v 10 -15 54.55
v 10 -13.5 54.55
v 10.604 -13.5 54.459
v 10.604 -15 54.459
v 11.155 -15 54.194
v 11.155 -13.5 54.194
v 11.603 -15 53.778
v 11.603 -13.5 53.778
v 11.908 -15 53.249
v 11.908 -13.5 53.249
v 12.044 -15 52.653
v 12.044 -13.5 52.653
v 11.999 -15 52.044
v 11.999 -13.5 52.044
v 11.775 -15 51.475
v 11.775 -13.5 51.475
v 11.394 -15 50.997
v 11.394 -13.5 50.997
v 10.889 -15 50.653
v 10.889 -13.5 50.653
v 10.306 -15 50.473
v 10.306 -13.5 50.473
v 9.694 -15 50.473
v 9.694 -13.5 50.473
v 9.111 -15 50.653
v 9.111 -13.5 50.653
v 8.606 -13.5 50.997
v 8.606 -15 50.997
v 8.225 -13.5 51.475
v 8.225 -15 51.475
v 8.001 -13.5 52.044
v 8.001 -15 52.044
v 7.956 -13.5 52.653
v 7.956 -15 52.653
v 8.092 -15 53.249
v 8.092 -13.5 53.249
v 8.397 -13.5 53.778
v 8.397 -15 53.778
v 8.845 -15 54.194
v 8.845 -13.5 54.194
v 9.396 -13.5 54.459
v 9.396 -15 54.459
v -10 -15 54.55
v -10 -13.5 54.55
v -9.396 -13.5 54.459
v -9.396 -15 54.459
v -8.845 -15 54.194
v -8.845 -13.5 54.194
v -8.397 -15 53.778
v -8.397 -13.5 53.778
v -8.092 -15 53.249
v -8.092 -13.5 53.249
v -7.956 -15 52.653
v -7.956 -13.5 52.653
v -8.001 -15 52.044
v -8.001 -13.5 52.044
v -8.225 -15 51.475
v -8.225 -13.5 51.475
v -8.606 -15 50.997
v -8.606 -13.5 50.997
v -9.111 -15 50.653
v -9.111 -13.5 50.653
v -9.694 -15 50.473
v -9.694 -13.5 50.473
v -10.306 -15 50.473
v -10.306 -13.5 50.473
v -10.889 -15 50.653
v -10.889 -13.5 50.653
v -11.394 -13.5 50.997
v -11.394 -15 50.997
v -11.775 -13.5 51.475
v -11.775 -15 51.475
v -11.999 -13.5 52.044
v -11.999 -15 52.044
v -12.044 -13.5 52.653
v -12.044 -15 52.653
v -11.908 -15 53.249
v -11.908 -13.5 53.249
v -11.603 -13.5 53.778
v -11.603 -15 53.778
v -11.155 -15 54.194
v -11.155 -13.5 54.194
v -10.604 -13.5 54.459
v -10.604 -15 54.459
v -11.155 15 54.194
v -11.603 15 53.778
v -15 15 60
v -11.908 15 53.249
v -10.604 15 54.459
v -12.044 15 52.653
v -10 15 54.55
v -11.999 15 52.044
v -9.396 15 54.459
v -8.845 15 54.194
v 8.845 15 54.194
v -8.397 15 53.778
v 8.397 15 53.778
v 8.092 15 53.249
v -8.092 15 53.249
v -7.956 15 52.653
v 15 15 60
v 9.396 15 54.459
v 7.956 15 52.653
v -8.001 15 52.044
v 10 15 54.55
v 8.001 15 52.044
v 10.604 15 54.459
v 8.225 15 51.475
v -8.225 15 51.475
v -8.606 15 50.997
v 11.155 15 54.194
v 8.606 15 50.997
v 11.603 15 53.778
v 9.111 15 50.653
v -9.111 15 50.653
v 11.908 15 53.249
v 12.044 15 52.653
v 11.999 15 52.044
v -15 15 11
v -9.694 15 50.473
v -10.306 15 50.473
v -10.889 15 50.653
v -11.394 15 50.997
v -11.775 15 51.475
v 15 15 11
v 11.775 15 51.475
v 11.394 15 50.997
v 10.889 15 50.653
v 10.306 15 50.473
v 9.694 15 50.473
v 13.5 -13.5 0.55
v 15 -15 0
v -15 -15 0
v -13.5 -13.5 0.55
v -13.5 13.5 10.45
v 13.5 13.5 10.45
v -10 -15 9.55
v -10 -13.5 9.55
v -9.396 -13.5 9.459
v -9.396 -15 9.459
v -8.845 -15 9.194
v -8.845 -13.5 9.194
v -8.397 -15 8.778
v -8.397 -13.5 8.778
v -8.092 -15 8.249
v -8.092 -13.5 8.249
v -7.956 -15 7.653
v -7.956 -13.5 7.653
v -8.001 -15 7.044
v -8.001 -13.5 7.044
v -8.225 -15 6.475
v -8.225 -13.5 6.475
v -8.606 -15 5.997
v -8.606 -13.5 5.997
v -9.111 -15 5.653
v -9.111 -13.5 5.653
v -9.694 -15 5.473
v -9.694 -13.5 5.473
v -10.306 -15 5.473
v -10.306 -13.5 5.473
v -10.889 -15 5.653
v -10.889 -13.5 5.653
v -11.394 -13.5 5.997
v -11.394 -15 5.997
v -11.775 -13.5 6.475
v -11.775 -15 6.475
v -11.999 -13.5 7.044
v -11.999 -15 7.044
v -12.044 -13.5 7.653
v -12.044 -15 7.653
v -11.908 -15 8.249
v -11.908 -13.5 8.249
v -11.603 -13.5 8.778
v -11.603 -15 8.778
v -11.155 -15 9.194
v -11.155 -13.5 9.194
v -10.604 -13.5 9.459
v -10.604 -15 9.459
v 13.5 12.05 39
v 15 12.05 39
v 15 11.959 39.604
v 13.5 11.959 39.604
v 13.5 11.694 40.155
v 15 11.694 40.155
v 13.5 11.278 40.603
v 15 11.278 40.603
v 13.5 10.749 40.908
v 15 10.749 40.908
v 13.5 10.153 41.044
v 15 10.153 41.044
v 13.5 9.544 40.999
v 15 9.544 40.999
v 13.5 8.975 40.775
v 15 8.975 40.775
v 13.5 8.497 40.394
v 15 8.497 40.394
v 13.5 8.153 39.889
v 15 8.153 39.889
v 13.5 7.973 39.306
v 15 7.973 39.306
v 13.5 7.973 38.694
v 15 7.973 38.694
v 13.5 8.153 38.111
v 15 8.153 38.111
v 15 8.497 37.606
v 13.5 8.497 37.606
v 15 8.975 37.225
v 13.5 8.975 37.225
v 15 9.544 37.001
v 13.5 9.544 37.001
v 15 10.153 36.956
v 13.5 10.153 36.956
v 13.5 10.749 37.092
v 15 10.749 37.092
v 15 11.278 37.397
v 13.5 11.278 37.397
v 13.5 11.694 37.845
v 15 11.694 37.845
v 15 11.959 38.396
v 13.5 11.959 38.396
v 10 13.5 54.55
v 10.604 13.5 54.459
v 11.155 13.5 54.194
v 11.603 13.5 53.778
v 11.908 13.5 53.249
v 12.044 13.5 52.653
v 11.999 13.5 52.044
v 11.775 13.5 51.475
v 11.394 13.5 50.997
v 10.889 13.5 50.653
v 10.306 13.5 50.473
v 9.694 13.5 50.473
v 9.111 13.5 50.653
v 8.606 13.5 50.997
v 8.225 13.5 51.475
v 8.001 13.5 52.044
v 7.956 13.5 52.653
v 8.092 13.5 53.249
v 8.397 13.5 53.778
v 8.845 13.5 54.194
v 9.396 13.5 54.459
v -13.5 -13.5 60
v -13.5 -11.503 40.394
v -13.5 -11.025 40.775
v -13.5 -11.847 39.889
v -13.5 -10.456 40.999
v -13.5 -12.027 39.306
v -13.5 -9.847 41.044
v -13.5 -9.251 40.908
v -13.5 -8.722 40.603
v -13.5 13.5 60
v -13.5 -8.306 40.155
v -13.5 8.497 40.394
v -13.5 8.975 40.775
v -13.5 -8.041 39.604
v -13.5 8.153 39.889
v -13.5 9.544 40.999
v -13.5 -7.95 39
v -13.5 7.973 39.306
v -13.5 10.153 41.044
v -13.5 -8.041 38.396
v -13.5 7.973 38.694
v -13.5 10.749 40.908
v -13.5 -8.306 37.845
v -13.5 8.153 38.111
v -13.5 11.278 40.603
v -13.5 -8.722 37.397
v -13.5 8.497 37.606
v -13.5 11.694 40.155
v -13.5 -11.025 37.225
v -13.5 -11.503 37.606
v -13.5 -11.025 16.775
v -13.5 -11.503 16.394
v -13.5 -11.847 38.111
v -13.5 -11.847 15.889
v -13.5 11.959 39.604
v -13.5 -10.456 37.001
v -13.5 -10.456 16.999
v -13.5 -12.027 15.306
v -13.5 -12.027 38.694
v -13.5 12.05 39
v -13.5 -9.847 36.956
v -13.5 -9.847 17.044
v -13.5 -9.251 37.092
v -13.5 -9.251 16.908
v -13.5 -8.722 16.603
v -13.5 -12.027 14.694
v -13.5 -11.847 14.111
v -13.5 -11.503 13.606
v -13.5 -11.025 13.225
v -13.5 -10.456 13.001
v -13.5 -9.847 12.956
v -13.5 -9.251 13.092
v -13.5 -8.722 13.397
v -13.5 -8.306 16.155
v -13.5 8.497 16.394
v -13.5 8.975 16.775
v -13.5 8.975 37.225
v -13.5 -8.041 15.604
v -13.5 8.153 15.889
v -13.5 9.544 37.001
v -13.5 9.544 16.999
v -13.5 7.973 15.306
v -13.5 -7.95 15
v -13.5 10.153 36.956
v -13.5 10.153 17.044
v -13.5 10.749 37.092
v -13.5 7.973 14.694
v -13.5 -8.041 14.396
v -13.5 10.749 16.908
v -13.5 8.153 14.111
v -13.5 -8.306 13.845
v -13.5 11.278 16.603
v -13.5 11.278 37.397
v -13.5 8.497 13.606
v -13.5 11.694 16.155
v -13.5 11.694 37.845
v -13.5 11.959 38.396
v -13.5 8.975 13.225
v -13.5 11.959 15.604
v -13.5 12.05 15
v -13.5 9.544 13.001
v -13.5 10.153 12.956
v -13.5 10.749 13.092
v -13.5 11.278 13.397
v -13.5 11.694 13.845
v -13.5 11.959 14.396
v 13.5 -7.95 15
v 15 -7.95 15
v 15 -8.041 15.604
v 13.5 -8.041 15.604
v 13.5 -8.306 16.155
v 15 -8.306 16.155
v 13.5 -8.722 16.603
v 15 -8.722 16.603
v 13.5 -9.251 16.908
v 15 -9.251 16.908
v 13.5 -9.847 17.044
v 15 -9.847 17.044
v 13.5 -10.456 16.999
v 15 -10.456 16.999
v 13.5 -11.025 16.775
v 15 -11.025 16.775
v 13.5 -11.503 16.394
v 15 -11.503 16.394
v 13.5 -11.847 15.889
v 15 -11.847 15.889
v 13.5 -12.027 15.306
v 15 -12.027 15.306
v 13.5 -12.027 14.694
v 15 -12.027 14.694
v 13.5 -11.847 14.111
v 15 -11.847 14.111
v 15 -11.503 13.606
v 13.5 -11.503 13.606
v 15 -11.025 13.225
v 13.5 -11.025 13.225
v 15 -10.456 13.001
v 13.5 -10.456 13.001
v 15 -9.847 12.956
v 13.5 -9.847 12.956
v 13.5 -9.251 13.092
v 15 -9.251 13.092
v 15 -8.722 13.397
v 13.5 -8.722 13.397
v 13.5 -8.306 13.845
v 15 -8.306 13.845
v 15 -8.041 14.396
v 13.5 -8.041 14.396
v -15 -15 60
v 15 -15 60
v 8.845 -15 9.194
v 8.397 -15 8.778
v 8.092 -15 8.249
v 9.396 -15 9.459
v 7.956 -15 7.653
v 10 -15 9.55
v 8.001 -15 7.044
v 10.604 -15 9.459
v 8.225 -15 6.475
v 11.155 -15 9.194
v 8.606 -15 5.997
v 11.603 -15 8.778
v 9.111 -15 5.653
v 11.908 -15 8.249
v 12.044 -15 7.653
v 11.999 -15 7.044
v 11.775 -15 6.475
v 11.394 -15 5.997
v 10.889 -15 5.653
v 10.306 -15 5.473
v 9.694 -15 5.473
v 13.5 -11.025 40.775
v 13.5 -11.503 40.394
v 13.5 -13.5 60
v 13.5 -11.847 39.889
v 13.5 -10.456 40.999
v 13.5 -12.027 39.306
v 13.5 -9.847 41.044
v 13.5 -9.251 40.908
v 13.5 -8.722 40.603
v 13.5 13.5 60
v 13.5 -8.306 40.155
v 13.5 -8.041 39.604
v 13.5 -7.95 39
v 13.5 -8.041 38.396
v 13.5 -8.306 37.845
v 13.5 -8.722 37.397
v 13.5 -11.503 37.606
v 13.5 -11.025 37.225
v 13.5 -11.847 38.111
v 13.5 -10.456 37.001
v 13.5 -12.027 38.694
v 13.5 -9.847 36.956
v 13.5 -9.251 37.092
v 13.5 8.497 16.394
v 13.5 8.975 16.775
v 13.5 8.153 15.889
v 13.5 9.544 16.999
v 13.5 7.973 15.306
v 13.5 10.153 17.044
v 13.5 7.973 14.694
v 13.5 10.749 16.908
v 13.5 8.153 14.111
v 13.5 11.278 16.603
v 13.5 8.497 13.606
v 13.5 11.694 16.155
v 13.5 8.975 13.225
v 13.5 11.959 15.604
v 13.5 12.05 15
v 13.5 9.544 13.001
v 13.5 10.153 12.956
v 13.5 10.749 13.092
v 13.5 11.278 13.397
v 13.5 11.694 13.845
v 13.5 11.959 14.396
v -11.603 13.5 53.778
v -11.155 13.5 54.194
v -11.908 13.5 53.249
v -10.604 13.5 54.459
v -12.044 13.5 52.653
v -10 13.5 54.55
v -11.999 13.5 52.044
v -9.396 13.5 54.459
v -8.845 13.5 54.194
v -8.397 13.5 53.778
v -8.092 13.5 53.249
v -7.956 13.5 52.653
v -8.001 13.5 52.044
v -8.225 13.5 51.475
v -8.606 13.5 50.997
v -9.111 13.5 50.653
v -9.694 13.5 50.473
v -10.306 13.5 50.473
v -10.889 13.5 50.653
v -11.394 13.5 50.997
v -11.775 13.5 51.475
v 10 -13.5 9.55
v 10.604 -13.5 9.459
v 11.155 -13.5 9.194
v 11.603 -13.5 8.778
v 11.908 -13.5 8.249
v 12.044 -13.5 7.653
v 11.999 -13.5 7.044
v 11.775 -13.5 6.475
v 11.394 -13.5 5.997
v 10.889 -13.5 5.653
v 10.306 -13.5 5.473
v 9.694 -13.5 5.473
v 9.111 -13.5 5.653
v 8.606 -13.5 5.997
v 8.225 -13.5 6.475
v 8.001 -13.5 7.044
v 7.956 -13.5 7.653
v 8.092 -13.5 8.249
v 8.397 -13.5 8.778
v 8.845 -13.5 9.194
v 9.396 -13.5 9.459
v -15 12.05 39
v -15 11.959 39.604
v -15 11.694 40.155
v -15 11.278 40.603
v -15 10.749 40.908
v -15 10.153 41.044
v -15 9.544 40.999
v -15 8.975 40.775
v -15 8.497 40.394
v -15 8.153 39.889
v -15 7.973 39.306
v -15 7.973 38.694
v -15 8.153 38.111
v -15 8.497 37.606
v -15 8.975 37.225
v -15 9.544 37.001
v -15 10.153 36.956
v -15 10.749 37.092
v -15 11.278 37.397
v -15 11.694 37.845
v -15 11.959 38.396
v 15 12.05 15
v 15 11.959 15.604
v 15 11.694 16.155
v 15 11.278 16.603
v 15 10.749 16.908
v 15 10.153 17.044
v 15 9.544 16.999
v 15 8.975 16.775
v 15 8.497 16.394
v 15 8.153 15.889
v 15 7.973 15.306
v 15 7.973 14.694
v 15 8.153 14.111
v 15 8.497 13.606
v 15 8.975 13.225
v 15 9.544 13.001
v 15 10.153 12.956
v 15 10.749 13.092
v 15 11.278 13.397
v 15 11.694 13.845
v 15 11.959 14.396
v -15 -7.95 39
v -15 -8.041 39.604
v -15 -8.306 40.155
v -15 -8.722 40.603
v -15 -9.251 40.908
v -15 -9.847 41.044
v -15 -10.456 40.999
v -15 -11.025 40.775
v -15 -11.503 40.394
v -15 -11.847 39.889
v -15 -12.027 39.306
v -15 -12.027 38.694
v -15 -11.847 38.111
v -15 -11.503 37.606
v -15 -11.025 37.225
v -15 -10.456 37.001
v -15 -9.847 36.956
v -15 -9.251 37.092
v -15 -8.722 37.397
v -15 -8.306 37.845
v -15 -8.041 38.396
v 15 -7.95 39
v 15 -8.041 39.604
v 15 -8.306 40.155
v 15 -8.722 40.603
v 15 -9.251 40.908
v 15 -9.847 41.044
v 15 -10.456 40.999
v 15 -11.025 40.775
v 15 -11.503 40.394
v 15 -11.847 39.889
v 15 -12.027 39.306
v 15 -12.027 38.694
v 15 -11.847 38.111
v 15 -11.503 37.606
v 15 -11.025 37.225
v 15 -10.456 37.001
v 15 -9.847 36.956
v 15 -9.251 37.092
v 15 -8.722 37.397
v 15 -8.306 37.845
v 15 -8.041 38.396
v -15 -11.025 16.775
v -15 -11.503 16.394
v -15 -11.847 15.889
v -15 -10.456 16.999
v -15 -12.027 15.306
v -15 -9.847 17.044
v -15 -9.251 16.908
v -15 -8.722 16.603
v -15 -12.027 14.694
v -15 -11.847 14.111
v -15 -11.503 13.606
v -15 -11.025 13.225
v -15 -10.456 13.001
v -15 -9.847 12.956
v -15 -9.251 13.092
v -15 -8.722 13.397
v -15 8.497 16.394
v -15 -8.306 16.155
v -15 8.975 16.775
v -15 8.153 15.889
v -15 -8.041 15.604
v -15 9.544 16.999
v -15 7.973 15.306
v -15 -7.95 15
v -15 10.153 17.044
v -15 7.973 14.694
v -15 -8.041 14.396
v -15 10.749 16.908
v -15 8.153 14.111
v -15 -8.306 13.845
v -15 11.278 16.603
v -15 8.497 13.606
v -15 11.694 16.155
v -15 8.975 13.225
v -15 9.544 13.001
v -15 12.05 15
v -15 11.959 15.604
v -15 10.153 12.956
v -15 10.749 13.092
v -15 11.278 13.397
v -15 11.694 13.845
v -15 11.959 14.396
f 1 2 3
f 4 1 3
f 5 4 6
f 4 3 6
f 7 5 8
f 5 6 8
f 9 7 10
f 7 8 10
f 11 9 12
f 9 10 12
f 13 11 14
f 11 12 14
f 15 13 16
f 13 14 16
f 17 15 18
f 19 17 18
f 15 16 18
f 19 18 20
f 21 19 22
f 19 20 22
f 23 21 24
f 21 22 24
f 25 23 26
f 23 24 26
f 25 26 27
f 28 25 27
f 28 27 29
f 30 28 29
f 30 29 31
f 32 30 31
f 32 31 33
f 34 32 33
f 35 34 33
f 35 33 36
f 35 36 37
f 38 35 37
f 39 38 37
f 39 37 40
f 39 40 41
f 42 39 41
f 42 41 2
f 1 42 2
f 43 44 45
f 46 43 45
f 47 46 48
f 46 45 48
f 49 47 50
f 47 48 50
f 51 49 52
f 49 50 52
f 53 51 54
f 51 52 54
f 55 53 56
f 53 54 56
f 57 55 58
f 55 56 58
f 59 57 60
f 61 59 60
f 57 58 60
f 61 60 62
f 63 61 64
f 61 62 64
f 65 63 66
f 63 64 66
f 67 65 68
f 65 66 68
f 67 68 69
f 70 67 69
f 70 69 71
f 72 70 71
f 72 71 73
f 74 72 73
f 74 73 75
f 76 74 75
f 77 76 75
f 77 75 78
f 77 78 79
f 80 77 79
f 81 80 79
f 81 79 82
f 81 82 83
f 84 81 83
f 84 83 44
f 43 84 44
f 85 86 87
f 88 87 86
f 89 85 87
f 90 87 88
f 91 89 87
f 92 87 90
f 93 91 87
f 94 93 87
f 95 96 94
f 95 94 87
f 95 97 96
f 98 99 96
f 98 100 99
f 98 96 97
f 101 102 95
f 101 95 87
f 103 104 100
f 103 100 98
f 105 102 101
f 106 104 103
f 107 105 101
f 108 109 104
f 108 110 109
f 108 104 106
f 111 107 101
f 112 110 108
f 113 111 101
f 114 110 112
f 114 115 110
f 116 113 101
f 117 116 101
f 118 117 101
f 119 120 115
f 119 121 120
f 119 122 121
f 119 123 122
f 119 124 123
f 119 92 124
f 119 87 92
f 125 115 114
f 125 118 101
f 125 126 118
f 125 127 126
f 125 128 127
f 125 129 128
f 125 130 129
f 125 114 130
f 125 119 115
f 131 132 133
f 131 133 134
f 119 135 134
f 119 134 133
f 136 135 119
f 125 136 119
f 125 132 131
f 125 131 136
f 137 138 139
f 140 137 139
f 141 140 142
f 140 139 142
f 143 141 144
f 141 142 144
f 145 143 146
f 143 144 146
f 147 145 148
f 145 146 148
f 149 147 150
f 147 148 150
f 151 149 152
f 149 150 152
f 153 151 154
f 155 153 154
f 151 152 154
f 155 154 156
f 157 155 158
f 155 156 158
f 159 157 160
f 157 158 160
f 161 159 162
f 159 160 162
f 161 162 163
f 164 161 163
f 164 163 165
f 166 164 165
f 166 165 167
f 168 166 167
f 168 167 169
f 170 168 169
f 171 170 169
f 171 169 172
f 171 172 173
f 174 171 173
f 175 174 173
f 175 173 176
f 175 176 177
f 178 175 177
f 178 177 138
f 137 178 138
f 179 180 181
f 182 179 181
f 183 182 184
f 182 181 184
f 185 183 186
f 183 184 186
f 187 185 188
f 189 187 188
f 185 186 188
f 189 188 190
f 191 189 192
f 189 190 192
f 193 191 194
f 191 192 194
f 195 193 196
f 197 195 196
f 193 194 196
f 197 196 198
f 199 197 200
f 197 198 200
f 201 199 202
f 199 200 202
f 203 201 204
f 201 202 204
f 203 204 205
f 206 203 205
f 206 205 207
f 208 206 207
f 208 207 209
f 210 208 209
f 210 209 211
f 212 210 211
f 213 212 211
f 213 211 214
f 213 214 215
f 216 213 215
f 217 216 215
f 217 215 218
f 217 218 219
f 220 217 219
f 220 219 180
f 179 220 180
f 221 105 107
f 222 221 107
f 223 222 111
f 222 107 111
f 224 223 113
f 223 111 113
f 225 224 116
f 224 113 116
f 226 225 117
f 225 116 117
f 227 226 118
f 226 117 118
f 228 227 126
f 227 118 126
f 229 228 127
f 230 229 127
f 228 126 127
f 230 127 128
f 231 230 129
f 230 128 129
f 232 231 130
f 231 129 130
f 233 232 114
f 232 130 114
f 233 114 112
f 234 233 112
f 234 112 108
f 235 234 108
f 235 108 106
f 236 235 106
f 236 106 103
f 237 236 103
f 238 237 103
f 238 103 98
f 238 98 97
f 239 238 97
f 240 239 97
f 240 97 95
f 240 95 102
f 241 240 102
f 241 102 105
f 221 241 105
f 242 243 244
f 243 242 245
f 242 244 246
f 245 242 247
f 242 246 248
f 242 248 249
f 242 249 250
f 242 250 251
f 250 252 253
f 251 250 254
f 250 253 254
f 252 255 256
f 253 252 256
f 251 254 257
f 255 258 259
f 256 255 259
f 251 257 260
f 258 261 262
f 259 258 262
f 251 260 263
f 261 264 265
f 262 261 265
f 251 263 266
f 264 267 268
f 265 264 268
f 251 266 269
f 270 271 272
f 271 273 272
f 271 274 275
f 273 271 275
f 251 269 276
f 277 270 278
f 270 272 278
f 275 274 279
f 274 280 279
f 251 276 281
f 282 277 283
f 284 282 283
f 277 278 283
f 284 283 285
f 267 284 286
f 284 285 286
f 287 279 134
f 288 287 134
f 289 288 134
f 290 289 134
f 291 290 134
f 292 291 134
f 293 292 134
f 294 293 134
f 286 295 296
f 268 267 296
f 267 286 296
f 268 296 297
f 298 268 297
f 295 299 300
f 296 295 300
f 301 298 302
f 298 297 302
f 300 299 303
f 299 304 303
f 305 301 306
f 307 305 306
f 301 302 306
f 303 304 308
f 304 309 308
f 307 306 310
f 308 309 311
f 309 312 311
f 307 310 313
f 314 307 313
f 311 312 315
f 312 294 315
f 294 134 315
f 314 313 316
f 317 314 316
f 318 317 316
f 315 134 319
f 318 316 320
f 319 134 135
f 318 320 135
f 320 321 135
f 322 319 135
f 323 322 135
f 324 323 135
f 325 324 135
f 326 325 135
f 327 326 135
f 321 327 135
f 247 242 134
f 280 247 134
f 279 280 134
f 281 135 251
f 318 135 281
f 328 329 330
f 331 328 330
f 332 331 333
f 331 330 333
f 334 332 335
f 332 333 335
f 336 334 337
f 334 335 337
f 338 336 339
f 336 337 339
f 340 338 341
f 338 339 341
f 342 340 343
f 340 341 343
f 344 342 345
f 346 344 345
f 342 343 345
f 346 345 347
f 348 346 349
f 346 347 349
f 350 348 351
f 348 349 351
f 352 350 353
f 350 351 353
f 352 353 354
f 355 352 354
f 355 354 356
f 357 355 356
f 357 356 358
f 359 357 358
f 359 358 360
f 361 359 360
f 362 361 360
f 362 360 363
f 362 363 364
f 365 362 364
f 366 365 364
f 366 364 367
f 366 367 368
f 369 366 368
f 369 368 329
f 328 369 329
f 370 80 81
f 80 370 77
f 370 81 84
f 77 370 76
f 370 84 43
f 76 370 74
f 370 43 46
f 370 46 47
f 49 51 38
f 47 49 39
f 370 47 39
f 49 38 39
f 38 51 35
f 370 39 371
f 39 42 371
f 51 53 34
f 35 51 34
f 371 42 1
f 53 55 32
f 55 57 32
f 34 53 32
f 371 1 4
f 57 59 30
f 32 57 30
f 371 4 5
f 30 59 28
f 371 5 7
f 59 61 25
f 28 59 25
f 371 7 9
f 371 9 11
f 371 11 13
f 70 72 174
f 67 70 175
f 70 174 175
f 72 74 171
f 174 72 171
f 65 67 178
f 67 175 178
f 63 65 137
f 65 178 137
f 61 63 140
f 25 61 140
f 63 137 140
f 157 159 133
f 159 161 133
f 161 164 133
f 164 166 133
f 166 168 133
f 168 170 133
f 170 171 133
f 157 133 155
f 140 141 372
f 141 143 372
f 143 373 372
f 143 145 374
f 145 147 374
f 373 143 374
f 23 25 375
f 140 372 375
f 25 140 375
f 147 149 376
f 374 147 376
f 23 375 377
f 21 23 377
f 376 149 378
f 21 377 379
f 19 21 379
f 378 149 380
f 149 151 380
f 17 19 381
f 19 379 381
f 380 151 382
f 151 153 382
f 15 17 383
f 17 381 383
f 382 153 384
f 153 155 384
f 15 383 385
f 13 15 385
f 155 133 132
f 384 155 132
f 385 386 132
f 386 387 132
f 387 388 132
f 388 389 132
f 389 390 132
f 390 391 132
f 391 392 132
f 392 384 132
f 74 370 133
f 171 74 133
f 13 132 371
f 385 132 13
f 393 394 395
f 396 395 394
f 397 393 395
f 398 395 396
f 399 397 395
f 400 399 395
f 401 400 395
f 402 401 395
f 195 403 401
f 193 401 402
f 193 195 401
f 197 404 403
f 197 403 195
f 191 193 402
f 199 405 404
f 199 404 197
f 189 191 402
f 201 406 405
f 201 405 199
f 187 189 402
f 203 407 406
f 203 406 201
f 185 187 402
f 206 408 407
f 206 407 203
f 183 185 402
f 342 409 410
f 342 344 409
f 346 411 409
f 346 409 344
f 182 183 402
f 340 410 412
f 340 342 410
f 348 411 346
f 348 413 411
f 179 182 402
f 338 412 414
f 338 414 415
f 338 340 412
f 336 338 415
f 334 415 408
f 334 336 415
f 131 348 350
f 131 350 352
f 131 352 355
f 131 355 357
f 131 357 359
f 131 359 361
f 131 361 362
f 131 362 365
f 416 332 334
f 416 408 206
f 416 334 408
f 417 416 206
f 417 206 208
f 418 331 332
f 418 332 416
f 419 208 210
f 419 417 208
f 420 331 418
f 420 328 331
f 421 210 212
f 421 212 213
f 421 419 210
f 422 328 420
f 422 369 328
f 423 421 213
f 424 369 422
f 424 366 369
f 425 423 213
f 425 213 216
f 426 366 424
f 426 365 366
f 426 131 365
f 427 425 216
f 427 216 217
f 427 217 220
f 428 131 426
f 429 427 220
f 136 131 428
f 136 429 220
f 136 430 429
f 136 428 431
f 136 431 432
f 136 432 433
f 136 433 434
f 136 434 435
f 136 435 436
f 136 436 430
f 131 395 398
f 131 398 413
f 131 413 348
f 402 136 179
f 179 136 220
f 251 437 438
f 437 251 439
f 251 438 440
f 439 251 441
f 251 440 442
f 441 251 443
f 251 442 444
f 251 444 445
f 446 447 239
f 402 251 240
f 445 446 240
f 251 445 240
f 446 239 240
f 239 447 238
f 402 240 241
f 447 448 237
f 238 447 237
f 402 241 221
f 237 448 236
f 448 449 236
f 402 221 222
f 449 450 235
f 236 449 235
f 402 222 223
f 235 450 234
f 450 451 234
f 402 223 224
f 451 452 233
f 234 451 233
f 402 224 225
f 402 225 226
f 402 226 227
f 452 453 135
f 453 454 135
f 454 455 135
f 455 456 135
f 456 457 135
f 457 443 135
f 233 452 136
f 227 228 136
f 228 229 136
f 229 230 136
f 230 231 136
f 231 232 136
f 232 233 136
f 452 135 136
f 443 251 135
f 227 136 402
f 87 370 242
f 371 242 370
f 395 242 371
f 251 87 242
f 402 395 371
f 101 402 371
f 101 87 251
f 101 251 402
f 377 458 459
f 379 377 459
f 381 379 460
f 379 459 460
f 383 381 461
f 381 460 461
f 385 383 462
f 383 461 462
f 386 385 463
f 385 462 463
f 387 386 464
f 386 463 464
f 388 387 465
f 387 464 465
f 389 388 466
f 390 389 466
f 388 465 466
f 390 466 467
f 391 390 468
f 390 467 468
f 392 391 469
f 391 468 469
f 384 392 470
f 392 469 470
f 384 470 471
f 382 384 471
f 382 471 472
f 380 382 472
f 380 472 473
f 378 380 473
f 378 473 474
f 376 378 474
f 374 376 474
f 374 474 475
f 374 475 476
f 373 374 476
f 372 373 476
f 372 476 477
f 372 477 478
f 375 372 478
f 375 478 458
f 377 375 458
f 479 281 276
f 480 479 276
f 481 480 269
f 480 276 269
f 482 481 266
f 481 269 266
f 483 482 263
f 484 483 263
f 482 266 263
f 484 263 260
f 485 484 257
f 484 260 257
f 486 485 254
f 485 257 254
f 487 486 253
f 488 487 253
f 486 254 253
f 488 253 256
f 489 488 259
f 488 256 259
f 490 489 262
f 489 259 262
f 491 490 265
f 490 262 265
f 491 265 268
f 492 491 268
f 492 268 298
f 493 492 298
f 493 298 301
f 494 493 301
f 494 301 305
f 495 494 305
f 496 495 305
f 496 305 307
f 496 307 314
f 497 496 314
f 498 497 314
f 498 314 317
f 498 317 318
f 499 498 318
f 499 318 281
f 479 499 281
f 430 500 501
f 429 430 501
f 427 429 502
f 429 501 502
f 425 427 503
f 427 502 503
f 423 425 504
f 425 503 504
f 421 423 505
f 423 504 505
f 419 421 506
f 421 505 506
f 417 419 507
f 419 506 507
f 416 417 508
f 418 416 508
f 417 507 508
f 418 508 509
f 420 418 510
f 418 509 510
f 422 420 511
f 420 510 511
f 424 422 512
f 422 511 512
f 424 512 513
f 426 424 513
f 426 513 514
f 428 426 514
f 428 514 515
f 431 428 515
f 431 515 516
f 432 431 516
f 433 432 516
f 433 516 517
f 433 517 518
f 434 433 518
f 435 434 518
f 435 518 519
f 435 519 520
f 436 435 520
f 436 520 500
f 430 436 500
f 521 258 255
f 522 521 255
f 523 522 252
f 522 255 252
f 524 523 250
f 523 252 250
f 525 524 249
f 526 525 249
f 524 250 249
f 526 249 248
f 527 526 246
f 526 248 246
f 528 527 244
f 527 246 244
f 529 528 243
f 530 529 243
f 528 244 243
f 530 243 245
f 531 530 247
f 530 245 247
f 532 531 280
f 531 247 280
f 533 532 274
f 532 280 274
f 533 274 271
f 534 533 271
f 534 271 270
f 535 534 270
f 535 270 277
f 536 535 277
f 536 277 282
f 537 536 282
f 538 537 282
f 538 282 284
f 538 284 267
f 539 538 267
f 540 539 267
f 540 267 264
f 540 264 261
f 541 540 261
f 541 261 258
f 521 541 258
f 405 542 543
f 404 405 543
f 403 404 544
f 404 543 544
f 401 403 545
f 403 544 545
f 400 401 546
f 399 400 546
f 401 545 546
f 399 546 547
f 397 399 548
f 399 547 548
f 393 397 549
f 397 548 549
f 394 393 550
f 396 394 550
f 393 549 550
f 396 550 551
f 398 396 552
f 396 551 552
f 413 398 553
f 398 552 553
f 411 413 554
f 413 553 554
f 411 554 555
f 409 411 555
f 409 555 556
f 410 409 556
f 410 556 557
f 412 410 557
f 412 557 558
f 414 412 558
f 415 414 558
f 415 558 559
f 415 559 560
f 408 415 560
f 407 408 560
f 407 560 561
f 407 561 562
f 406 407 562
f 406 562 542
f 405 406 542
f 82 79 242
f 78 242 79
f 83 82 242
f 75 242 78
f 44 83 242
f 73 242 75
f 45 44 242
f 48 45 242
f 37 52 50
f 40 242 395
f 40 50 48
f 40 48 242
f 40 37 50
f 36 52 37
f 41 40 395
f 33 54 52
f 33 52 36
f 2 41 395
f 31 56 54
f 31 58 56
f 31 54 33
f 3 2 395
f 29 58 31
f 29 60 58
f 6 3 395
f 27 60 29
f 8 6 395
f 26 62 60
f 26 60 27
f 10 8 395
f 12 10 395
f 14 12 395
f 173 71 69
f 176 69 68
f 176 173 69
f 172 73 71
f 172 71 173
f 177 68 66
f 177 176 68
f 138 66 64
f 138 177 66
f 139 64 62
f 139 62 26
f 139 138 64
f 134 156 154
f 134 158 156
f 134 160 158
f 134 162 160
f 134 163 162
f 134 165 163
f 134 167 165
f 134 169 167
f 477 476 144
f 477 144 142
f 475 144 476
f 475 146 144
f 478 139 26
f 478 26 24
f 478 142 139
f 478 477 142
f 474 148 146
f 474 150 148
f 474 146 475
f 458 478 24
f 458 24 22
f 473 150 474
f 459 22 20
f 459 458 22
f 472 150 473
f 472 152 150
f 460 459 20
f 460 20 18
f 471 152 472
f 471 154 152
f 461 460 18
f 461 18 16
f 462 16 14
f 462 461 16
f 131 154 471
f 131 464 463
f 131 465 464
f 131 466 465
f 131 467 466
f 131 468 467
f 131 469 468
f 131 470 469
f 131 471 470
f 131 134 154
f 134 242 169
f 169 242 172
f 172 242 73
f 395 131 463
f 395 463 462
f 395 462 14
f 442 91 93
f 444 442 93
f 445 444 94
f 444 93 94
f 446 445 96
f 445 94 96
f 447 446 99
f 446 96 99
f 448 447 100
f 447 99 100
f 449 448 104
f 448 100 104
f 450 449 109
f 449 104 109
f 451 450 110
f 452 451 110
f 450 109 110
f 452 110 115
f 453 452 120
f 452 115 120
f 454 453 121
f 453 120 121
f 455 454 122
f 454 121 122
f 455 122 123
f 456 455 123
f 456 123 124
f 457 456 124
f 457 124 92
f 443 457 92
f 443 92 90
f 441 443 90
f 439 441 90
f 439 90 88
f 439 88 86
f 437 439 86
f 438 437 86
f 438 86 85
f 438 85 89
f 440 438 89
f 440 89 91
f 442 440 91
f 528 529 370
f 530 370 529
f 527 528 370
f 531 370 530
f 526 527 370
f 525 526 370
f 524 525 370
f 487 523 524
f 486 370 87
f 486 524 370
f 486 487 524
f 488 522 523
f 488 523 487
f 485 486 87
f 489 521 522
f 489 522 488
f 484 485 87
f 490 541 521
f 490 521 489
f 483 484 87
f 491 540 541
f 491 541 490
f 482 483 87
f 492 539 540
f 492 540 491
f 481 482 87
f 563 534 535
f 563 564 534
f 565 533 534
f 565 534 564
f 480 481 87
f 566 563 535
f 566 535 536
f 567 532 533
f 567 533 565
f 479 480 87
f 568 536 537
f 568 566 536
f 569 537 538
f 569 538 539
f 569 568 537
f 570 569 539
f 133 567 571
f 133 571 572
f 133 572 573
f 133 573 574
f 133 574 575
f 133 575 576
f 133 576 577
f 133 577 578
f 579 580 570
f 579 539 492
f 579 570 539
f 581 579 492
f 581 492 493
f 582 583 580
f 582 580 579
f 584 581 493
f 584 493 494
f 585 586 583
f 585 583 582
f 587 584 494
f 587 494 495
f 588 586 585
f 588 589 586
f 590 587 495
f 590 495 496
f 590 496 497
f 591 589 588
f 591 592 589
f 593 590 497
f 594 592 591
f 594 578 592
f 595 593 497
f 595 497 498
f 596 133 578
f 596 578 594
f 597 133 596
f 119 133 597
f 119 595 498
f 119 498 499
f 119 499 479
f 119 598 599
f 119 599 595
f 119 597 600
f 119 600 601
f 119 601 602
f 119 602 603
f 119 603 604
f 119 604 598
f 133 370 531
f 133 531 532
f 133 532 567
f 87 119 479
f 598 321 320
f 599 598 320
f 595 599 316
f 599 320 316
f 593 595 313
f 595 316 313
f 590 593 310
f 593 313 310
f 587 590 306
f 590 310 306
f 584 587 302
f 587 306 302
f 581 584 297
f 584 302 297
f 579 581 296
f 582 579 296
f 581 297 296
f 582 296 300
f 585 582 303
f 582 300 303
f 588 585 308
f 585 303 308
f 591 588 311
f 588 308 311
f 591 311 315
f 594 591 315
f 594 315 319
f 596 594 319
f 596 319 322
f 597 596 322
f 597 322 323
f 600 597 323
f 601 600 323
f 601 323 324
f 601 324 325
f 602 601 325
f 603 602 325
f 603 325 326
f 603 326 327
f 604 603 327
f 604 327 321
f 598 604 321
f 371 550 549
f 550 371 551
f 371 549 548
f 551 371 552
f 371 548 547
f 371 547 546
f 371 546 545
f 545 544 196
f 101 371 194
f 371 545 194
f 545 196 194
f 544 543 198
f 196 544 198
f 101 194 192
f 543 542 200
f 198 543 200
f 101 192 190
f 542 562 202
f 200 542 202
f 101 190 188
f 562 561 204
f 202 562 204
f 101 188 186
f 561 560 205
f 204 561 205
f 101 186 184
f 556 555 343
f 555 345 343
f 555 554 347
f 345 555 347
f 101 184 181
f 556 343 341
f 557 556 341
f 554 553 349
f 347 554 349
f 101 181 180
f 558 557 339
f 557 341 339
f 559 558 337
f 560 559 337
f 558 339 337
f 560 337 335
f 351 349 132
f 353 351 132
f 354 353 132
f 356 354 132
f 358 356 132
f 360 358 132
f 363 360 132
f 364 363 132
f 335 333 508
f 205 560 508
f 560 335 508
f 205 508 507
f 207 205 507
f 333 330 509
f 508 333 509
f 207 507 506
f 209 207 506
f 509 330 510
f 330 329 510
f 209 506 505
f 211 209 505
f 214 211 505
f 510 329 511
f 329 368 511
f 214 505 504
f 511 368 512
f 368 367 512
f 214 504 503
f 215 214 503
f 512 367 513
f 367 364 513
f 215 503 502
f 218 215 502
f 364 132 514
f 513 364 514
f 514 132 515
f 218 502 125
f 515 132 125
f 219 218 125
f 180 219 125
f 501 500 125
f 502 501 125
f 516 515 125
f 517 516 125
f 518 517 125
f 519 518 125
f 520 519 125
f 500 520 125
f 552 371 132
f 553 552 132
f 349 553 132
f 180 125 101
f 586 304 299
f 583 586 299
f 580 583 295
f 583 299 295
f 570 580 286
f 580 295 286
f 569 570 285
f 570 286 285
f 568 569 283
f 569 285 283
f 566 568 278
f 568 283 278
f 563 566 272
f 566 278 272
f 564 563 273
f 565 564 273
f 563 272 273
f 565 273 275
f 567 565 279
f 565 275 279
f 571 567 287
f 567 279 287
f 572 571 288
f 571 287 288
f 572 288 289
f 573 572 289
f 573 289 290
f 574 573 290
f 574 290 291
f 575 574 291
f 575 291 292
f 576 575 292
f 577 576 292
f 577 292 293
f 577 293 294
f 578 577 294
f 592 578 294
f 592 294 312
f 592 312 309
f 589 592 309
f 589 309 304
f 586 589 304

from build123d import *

# Parameters (mm, degrees)
SKETCH_1_W          = 30
SKETCH_1_H          = 30
SKETCH_1_W_2        = 27
SKETCH_1_H_2        = 27
EXTRUDE_1_DEPTH     = 60
SKETCH_2_R          = 2.05
CUT_EXTRUDE_1_DEPTH = 69.738635424
SKETCH_3_R          = 2.05
CUT_EXTRUDE_2_DEPTH = 69.738635424
CUT_EXTRUDE_4_DEPTH = 69.738635424


with BuildPart() as part:
    # 草图1 → 凸台-拉伸1 (new body)
    with BuildSketch(Plane.XY):
        Rectangle(SKETCH_1_W, SKETCH_1_H)
        Rectangle(SKETCH_1_W_2, SKETCH_1_H_2, mode=Mode.SUBTRACT)
    extrude(amount=EXTRUDE_1_DEPTH)

    # 草图2 → 切除-拉伸1 (cut, through all)
    with BuildSketch(Plane(origin=(0, 15, 0), x_dir=(1, 0, 0), z_dir=(0, 1, 0))):
        with Locations(Location((-10, -7.5, 0), (0, 0, 270))):
            Circle(SKETCH_2_R)
        with Locations(Location((10, -7.5, 0), (0, 0, 270))):
            Circle(SKETCH_2_R)
        with Locations(Location((-10, -52.5, 0), (0, 0, 270))):
            Circle(SKETCH_2_R)
        with Locations(Location((10, -52.5, 0), (0, 0, 270))):
            Circle(SKETCH_2_R)
    extrude(amount=-CUT_EXTRUDE_1_DEPTH, mode=Mode.SUBTRACT)

    # 草图3 → 切除-拉伸2 (cut, through all)
    with BuildSketch(Plane(origin=(15, 0, 0), x_dir=(0, 0, -1), z_dir=(1, 0, 0))):
        with Locations(Location((-39, 10, 0), (0, 0, 90))):
            Circle(SKETCH_3_R)
        with Locations(Location((-39, -10, 0), (0, 0, 90))):
            Circle(SKETCH_3_R)
        with Locations(Location((-15, -10, 0), (0, 0, 90))):
            Circle(SKETCH_3_R)
        with Locations(Location((-15, 10, 0), (0, 0, 90))):
            Circle(SKETCH_3_R)
    extrude(amount=-CUT_EXTRUDE_2_DEPTH, mode=Mode.SUBTRACT)

    # 草图5 → 切除-拉伸4 (cut, through all)
    with BuildSketch(Plane(origin=(15, 0, 0), x_dir=(0, 0, -1), z_dir=(1, 0, 0))):
        Polygon((0, -15), (-11, 15), (0, 15), align=None)
    extrude(amount=-CUT_EXTRUDE_4_DEPTH, mode=Mode.SUBTRACT)


solid = part.part
